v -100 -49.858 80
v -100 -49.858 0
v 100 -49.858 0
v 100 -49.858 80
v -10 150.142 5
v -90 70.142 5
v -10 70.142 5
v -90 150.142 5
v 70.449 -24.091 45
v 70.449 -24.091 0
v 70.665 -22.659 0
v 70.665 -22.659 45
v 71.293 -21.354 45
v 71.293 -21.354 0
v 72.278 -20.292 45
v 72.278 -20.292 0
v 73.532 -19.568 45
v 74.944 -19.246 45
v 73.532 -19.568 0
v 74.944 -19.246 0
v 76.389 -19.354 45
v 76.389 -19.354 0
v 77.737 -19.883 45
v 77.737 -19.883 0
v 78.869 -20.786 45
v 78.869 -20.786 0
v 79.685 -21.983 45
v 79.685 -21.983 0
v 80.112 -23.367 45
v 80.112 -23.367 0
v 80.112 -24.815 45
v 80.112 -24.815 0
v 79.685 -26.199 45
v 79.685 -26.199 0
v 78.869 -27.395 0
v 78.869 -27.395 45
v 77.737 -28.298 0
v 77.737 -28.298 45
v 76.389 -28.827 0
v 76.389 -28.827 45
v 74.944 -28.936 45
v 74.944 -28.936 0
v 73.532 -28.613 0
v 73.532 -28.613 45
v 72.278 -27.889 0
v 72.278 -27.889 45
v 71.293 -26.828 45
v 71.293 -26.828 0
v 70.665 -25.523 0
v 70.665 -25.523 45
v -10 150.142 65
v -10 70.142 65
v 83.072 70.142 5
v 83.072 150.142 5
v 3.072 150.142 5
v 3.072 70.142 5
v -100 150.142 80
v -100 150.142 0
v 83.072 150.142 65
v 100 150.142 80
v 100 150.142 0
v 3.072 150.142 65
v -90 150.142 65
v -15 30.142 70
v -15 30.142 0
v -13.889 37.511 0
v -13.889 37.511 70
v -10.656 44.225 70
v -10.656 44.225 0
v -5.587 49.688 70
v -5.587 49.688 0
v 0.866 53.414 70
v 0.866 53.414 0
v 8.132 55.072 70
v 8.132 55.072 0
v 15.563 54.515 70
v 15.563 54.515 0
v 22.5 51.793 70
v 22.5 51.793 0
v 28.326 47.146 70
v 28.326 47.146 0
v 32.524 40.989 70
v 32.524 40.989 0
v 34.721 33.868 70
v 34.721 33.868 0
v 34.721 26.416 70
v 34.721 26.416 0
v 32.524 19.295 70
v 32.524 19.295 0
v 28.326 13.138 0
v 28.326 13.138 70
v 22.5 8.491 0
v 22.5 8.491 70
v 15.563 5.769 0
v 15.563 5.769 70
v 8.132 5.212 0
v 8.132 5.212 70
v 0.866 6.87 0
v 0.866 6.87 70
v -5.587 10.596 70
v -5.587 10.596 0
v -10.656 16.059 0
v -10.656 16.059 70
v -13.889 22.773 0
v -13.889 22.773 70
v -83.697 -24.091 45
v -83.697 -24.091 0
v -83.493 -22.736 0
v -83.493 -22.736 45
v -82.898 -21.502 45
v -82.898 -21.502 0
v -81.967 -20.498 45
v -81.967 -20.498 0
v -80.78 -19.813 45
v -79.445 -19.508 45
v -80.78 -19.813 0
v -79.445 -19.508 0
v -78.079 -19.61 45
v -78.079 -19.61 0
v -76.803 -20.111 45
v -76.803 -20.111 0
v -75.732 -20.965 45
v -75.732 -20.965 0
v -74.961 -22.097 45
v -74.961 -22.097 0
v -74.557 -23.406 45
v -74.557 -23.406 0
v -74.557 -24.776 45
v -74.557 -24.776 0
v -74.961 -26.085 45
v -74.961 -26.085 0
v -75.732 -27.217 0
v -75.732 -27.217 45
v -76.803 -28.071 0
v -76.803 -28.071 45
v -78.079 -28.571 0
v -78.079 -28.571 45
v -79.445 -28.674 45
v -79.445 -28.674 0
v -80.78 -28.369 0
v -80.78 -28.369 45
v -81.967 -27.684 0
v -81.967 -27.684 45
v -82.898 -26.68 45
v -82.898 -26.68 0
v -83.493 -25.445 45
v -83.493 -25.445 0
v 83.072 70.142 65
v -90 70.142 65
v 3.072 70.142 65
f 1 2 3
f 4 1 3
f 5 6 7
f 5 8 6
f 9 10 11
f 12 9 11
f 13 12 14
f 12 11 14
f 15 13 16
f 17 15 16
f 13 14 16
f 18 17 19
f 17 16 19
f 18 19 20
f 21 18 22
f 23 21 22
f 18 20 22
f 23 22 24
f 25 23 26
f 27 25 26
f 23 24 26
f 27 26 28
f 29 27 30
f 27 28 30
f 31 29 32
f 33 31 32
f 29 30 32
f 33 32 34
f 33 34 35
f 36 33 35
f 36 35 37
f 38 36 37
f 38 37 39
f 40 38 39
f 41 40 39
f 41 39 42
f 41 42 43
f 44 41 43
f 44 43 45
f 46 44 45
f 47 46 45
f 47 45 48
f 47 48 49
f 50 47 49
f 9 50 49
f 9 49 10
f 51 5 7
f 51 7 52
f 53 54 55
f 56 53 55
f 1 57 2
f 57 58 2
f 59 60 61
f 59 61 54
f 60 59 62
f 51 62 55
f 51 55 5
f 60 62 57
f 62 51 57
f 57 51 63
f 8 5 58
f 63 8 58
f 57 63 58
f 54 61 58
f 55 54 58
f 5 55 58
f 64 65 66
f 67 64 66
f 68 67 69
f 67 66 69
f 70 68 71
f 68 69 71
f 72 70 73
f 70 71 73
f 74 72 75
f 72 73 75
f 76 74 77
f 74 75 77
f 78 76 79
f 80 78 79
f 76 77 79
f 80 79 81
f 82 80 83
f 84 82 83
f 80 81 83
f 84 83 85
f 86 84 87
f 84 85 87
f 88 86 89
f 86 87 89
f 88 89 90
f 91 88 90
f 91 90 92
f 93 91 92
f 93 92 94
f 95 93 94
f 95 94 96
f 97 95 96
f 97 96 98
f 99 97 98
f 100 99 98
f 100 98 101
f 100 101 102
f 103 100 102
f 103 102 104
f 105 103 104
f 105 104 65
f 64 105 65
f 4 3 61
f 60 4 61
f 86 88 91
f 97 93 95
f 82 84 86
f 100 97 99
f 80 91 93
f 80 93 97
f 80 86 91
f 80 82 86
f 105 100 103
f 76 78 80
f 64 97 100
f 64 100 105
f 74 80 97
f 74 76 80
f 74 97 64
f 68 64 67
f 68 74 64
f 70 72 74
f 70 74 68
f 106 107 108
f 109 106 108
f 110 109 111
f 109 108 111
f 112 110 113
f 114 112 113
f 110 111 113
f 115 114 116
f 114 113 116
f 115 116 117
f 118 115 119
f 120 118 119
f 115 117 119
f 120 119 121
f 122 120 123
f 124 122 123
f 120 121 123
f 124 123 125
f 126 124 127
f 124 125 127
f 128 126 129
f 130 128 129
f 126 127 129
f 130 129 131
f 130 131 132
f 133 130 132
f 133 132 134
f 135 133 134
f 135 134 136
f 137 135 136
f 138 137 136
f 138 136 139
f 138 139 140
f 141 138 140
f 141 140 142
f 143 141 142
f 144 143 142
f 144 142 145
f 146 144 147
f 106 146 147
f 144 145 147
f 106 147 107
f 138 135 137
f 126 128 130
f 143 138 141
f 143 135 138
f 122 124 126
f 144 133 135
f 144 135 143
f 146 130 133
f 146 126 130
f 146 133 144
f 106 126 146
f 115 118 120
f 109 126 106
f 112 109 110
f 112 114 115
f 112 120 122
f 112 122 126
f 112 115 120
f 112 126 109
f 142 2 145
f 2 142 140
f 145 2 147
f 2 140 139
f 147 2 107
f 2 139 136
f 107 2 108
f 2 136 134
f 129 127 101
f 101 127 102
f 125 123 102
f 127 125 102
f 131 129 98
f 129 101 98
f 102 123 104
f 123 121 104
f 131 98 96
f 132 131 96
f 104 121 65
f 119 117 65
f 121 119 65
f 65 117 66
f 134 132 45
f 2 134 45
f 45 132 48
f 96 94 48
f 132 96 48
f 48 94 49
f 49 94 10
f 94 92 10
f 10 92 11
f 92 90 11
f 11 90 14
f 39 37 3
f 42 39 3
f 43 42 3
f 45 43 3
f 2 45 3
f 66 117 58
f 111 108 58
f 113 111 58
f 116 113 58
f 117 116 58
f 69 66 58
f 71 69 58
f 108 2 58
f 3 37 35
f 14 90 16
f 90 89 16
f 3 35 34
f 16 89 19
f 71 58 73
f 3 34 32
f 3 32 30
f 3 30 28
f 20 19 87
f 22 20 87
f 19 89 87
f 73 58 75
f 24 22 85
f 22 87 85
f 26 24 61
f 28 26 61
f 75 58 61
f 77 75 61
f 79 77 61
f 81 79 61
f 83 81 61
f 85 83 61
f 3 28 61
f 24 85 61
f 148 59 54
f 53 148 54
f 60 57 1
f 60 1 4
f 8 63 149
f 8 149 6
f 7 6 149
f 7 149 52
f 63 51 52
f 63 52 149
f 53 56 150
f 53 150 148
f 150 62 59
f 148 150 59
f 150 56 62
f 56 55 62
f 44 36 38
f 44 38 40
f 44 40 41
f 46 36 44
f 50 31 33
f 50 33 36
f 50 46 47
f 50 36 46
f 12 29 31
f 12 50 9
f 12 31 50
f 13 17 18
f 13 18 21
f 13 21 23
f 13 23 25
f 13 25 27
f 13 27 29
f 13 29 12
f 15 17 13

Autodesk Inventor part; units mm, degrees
ref_plane "YZ Plane" through (0, 0, 0) normal (1, 0, 0) x (0, 1, 0)
ref_plane "XZ Plane" through (0, 0, 0) normal (0, 1, 0) x (-1, 0, 0)
ref_plane "XY Plane" through (0, 0, 0) normal (0, 0, 1) x (1, 0, 0)
sketch "Sketch1" plane through (0, 0, 0) normal (0, 0, 1) x (1, 0, 0)
  line L0 (-100, -49.8579) -> (100, -49.8579)
  line L1 (100, -49.8579) -> (100, 150.1421)
  line L2 (100, 150.1421) -> (-100, 150.1421)
  line L3 (-100, 150.1421) -> (-100, -49.8579)
  line L4 (-100, -49.8579) -> (100, 150.1421) construction
  line L5 (100, -49.8579) -> (-100, 150.1421) construction
  point P0 (0, 50.1421)
  dimension "d13" = 200
  dimension "d14" = 200
  dimension "d17" = 200
extrude "Extrusion1" add sketch "Sketch1" along normal blind 80
sketch "Sketch2" plane through (-100, 150.1421, 0) normal (0, 1, 0) x (1, 0, 0)
  line L0 (90, -65) -> (10, -65)
  line L1 (10, -65) -> (10, -5)
  line L2 (10, -5) -> (90, -5)
  line L3 (90, -5) -> (90, -65)
  line L4 (90, -65) -> (10, -5) construction
  line L5 (10, -65) -> (90, -5) construction
  line L6 (0, 0) -> (0, -80) projected
  line L7 (200, 0) -> (0, 0) projected
  point P0 (100, 0)
  point P1 (50, -35)
  dimension "d7" = 80
  dimension "d8" = 60
  dimension "d9" = 10
  dimension "d10" = 5
extrude "Extrusion2" cut sketch "Sketch2" against normal blind 80
sketch "Sketch3" plane through (0, 0, 0) normal (0, 0, -1) x (-1, 0, 0)
  circle A0 centre (-10, 30.1421) radius 25
  line L0 (100, -49.8579) -> (-100, -49.8579) projected
  line L1 (-100, -49.8579) -> (-100, 150.1421) projected
  point P0 (0, 0)
  dimension "d19" = 50
  dimension "d20" = 80
  dimension "d21" = 90
extrude "Extrusion3" cut sketch "Sketch3" against normal blind 70
sketch "Sketch4" plane through (-100, 150.1421, 0) normal (0, 1, 0) x (1, 0, 0)
  line L0 (183.0719, -5) -> (103.0719, -5)
  line L1 (103.0719, -5) -> (103.0719, -65)
  line L2 (103.0719, -65) -> (183.0719, -65)
  line L3 (183.0719, -65) -> (183.0719, -5)
  line L4 (183.0719, -5) -> (103.0719, -65) construction
  line L5 (103.0719, -5) -> (183.0719, -65) construction
  line L6 (200, 0) -> (0, 0) projected
  point P0 (100, 0)
  point P1 (143.0719, -35)
  dimension "d24" = 80
  dimension "d25" = 60
  dimension "d26" = 5
extrude "Extrusion4" cut sketch "Sketch4" against normal blind 80
sketch "Sketch5" plane through (0, 0, 0) normal (0, 0, -1) x (-1, 0, 0)
  circle A0 centre (79.1012, -24.0908) radius 4.5958
  circle A1 centre (-75.3074, -24.0908) radius 4.8585
  point P0 (0, 0)
extrude "Extrusion5" cut sketch "Sketch5" against normal blind 45
properties part number "exploration1.1"
